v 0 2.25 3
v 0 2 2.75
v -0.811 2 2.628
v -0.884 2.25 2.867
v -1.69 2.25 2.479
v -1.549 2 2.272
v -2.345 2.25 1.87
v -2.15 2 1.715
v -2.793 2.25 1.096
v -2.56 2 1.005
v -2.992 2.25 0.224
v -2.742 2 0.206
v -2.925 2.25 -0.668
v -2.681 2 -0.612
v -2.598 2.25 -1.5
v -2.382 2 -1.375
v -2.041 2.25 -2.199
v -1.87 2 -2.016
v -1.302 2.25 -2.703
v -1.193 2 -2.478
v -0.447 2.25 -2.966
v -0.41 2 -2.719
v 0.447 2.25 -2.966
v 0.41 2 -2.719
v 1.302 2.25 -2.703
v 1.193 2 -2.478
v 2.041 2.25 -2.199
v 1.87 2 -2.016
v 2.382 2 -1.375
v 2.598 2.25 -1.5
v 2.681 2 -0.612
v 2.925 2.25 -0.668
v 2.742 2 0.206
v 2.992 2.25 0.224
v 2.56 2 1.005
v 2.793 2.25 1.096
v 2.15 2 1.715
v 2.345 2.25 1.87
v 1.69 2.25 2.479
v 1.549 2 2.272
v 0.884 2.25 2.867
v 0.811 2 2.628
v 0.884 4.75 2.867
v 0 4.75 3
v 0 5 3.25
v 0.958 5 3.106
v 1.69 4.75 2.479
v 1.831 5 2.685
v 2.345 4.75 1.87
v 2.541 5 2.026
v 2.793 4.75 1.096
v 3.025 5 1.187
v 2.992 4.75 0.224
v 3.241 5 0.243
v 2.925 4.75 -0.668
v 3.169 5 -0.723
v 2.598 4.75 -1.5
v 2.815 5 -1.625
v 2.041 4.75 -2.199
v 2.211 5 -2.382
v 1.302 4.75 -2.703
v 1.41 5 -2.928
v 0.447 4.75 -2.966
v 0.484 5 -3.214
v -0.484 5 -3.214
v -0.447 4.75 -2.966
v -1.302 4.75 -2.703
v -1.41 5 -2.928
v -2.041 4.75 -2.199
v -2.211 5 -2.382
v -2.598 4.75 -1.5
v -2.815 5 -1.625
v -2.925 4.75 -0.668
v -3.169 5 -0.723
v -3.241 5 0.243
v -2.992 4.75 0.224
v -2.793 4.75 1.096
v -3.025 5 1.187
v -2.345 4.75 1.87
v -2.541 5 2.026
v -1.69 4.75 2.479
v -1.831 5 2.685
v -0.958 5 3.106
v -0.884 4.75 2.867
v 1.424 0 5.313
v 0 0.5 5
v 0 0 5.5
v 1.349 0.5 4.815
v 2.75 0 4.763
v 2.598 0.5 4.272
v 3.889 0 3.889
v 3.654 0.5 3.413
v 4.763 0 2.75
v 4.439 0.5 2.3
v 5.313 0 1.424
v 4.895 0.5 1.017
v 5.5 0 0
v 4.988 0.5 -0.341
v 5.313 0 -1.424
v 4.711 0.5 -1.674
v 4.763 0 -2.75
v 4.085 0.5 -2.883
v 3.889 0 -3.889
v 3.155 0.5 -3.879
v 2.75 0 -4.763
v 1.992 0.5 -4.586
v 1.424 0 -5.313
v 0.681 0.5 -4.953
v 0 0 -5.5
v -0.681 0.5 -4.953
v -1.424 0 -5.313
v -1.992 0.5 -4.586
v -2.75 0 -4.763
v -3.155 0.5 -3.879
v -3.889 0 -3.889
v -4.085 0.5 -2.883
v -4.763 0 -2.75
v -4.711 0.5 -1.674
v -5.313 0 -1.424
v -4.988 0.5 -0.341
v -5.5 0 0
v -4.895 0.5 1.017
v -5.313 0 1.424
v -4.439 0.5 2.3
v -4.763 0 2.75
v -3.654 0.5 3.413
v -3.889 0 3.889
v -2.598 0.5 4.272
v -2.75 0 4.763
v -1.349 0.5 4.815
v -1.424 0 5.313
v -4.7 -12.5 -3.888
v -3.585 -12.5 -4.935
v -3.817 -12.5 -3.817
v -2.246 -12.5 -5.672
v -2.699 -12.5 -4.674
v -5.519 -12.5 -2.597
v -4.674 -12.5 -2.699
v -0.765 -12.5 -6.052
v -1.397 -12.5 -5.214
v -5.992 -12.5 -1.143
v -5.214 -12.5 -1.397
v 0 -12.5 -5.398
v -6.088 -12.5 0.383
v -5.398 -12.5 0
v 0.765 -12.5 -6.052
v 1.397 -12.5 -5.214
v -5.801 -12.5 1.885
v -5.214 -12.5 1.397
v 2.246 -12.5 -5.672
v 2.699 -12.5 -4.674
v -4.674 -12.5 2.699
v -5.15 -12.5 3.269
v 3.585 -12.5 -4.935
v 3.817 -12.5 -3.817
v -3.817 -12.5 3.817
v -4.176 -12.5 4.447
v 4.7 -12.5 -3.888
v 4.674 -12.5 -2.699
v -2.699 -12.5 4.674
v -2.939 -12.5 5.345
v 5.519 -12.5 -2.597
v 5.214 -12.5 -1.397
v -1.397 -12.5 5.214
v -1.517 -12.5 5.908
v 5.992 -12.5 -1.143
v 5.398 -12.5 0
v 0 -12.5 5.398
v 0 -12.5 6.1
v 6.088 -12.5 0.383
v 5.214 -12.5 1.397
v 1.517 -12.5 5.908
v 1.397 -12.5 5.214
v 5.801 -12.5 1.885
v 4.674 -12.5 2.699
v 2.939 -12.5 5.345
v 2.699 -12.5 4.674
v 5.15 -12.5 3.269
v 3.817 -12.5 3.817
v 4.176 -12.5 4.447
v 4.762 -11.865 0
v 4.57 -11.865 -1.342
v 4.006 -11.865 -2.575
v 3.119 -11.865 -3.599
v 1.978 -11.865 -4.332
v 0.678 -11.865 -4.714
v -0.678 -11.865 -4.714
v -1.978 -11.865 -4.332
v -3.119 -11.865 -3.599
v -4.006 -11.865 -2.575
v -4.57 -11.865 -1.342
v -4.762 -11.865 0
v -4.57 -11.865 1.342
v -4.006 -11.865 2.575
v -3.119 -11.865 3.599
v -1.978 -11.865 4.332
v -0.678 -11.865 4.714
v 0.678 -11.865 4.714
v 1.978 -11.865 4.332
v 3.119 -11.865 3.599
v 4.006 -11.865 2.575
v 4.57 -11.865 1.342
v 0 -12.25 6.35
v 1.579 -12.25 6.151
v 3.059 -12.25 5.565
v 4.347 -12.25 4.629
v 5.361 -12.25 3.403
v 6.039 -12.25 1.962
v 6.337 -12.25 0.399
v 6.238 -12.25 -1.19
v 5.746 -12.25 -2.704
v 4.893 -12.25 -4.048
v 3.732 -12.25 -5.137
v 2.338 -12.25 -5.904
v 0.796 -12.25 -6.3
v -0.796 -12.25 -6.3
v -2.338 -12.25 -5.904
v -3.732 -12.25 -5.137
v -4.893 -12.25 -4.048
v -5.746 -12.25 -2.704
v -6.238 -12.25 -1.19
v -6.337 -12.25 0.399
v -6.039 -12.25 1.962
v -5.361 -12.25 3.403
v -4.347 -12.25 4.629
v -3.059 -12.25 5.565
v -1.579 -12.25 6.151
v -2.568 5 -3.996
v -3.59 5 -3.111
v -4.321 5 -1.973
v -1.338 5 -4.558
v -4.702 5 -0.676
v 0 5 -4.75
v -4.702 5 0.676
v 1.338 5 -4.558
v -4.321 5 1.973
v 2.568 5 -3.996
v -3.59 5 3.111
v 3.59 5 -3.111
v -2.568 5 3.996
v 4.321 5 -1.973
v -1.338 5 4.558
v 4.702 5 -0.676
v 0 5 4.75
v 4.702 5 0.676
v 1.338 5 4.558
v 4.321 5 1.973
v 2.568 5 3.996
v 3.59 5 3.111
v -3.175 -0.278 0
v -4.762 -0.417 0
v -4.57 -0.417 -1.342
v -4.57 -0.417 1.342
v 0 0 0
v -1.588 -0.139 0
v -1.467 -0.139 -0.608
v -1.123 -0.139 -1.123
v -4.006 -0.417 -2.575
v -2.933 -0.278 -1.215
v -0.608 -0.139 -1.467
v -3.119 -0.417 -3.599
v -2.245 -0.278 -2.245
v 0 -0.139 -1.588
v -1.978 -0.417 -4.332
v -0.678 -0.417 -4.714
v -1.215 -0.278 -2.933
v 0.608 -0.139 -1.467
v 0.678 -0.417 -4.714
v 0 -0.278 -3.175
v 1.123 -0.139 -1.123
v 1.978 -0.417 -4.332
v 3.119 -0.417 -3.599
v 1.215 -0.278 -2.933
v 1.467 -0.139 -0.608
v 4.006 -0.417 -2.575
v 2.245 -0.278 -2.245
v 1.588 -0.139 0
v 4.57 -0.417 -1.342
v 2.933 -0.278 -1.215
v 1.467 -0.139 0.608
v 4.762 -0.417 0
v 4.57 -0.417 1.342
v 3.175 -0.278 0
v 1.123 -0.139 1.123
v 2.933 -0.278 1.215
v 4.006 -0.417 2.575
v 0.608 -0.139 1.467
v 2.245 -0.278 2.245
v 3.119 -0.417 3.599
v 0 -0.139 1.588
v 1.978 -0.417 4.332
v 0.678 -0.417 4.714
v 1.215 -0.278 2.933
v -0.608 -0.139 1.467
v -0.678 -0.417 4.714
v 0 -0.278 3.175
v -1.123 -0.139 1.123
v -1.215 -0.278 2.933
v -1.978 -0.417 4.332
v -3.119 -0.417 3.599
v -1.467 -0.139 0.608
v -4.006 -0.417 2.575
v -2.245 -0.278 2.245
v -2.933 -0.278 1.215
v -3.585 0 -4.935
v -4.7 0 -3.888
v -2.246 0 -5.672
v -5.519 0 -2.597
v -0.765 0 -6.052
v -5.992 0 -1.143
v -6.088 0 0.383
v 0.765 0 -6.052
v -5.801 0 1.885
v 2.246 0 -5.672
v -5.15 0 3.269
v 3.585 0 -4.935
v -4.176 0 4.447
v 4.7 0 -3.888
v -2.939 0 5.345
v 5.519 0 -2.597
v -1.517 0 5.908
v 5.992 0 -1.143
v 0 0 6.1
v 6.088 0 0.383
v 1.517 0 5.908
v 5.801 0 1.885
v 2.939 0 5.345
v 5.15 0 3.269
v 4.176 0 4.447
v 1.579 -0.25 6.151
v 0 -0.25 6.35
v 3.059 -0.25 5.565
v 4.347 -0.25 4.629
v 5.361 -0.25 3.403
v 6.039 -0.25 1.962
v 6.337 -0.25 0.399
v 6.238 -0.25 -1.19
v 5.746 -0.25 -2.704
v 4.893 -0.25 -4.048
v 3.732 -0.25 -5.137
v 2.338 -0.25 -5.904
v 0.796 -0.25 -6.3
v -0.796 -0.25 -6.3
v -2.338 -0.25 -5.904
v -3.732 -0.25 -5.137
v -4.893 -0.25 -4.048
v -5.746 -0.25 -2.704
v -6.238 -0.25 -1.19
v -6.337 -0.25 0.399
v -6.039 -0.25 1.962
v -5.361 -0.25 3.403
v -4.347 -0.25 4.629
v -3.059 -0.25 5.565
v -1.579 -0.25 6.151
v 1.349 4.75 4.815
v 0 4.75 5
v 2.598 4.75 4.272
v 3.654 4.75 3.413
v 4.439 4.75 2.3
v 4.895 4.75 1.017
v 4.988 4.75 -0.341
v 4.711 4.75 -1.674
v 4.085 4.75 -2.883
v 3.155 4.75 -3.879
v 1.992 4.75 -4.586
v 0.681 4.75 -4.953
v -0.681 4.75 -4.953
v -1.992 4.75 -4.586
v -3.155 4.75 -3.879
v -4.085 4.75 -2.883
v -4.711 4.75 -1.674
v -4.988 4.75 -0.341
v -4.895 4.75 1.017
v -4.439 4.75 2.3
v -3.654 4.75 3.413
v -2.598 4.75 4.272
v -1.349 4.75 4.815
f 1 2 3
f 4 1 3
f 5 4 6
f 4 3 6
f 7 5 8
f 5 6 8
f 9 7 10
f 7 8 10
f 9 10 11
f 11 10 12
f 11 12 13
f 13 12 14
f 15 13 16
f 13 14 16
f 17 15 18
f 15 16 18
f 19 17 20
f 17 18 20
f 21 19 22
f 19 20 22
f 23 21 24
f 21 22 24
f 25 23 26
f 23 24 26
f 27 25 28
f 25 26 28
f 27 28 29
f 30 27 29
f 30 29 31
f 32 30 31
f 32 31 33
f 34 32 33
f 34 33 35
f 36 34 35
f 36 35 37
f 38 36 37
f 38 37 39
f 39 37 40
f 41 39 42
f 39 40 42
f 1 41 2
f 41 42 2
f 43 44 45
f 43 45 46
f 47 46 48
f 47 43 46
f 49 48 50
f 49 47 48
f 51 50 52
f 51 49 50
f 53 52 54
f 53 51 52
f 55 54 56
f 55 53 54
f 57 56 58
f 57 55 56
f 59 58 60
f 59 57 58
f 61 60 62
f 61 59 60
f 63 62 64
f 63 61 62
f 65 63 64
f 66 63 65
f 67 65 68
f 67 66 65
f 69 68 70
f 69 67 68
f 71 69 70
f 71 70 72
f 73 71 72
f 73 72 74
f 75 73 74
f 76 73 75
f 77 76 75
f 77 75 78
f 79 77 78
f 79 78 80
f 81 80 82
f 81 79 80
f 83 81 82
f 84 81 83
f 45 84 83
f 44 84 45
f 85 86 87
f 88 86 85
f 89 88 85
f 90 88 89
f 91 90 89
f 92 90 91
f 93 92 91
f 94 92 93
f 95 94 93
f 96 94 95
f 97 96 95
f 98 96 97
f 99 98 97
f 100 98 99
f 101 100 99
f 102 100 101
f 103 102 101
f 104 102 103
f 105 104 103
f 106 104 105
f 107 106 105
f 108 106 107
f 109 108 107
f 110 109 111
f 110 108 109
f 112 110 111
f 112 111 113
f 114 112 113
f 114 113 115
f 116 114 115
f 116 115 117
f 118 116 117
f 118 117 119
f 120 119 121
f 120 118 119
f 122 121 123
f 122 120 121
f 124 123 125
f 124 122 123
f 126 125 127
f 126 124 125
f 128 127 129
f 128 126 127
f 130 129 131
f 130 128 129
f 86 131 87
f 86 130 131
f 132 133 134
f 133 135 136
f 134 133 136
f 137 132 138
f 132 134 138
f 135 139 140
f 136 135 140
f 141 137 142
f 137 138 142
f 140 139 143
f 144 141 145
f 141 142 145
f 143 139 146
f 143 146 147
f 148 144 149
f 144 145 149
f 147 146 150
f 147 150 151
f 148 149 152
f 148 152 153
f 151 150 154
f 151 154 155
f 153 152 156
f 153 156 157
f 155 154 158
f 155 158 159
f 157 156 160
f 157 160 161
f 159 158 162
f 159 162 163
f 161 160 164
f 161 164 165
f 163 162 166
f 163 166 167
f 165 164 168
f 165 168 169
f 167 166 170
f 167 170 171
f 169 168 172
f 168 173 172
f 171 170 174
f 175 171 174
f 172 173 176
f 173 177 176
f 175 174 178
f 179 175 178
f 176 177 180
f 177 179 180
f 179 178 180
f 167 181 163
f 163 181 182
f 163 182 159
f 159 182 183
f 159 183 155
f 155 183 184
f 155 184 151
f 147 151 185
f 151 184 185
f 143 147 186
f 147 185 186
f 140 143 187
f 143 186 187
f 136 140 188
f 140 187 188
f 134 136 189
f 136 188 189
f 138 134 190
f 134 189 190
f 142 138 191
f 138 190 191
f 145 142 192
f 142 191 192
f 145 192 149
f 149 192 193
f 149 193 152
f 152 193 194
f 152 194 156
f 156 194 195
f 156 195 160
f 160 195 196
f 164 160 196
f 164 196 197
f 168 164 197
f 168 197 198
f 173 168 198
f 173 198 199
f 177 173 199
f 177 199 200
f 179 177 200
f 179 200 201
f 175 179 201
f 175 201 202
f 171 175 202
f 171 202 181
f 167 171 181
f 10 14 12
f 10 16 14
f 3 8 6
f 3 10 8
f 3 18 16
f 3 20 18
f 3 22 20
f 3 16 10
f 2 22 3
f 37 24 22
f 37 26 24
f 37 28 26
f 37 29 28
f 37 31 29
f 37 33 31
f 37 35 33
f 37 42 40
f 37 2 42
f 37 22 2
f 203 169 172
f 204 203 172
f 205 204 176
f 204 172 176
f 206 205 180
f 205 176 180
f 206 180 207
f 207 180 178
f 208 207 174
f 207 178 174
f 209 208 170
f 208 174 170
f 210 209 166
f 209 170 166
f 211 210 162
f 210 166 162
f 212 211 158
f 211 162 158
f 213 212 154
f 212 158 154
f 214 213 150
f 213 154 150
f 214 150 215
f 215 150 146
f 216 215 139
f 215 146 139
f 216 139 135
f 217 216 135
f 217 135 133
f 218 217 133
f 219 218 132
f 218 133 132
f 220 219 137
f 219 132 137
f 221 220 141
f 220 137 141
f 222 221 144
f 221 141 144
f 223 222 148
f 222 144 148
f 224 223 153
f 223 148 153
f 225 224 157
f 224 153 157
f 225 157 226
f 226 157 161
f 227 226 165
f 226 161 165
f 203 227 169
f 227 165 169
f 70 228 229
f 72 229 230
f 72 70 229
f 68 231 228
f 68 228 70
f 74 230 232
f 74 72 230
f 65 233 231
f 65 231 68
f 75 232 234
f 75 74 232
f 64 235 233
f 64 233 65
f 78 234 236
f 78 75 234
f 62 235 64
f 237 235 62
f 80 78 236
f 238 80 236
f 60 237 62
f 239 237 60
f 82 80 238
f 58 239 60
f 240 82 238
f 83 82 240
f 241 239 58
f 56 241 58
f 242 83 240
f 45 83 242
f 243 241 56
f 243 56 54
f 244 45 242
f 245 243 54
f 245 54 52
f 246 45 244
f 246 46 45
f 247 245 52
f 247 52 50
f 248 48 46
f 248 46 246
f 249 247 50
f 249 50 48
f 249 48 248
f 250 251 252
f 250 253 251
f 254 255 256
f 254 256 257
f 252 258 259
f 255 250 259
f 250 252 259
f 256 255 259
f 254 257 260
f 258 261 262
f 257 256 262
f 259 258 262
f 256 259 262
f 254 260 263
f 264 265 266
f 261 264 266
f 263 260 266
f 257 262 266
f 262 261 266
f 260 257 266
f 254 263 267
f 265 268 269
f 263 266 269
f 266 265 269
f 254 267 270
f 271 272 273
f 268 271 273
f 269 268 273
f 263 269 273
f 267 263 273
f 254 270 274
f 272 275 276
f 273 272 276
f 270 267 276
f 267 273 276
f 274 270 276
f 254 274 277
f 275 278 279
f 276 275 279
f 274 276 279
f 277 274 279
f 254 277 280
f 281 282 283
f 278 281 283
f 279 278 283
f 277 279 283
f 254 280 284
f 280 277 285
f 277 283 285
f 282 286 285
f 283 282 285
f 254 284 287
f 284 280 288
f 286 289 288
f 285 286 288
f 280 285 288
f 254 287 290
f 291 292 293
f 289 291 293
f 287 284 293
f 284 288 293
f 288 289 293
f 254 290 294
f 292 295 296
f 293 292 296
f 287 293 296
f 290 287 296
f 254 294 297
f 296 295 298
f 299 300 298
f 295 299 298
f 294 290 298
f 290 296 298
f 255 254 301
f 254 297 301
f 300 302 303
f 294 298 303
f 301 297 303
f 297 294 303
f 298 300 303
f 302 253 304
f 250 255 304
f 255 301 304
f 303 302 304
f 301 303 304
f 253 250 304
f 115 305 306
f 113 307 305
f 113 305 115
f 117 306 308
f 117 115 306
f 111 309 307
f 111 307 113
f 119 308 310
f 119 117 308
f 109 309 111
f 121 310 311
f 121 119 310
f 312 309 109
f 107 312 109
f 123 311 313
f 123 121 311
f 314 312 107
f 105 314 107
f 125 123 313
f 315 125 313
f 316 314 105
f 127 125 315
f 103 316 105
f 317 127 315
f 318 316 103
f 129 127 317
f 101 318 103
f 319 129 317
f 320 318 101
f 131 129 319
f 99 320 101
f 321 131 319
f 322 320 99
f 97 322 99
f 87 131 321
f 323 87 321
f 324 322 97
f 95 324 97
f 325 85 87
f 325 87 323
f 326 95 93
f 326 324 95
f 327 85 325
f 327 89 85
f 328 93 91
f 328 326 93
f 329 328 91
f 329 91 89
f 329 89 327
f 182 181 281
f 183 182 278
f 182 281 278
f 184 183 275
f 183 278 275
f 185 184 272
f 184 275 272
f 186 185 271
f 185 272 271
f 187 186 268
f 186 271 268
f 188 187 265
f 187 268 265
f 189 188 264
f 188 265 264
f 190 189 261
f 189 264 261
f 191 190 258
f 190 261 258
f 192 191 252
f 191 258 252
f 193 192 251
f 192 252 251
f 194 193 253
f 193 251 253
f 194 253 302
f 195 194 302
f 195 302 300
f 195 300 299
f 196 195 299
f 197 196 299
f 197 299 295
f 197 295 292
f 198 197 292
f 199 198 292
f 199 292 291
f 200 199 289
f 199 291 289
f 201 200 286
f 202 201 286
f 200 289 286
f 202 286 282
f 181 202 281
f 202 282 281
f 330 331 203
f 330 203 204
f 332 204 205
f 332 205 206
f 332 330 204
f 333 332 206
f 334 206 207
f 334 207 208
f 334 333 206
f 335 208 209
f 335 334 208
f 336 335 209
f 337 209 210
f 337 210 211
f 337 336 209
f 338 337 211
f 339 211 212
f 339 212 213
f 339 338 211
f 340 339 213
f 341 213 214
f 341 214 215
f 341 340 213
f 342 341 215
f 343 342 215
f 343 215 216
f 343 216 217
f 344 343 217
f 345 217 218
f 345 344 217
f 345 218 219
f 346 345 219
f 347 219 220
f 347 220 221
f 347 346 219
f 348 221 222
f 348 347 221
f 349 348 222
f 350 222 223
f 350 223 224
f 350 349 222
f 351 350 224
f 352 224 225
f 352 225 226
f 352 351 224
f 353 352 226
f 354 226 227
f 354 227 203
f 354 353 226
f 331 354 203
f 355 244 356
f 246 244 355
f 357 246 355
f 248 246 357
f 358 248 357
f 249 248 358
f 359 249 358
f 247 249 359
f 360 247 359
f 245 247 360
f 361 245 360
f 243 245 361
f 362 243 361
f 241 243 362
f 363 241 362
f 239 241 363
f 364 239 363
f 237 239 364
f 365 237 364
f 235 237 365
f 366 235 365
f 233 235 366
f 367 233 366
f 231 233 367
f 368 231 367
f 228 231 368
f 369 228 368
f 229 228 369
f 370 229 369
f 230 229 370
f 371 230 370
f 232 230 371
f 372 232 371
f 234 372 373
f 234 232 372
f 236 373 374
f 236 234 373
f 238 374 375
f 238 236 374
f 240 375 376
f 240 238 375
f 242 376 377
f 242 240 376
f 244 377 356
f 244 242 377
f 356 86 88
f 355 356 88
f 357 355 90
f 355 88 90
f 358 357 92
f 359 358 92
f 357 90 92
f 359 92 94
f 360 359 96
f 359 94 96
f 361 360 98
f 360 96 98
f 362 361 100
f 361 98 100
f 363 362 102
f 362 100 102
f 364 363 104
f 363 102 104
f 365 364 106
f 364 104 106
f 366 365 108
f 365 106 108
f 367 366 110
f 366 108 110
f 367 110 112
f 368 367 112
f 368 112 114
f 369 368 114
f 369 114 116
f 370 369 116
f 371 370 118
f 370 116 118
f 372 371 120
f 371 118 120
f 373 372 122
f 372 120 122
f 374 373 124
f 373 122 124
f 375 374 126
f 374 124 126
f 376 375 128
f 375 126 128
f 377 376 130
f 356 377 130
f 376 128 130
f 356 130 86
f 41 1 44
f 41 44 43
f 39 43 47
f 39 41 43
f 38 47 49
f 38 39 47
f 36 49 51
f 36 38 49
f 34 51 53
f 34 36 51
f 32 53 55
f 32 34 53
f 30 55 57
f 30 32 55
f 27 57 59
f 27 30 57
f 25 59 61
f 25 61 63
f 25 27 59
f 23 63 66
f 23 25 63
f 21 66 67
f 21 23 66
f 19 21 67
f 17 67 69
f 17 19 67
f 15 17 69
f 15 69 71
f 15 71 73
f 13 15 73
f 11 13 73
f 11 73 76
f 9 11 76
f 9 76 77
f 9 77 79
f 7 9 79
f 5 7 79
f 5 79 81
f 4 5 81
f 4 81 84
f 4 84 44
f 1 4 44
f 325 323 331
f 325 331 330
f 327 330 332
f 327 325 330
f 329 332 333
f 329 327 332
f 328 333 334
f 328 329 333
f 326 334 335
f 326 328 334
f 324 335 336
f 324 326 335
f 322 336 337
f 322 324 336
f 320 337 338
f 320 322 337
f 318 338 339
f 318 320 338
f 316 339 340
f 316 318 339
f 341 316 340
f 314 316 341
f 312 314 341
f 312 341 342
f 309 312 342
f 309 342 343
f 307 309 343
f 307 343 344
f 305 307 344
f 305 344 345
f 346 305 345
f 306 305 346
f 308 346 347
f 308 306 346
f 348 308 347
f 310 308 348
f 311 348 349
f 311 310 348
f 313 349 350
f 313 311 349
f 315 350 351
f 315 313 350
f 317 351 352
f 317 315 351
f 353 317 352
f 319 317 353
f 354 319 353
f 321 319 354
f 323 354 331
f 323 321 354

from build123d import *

# Parameters (mm, degrees)
SKETCH1_R                              = 5
BOSS_EXTRUDE1_DEPTH                    = 2
SKETCH1_3_R                            = 5
SKETCH1_3_R_2                          = 3
BOSS_EXTRUDE2_DEPTH                    = 5
CHAMFER1_SIZE                          = 0.25
SKETCH5_R                              = 6.35
BOSS_EXTRUDE4_DEPTH                    = 12.5
F_3_8_0_375_DIAMETER_HOLE1_D           = 9.525
F_3_8_0_375_DIAMETER_HOLE1_DEPTH       = 12.08333524
F_3_8_0_375_DIAMETER_HOLE1_CSINK_D     = 10.795
F_3_8_0_375_DIAMETER_HOLE1_CSINK_ANGLE = 90
F_3_8_0_375_DIAMETER_HOLE1_TIP         = 0.41666476
CHAMFER2_SIZE                          = 0.25
CHAMFER3_SIZE                          = 0.5


with BuildPart() as part:
    # Sketch1 → Boss-Extrude1 (new body)
    with BuildSketch(Plane(origin=(0, 0, 0), x_dir=(1, 0, 0), z_dir=(0, 1, 0))):
        Circle(SKETCH1_R)
    extrude(amount=BOSS_EXTRUDE1_DEPTH)

    # Sketch1<3> → Boss-Extrude2 (add)
    with BuildSketch(Plane(origin=(0, 0, 0), x_dir=(1, 0, 0), z_dir=(0, 1, 0))):
        Circle(SKETCH1_3_R)
        Circle(SKETCH1_3_R_2, mode=Mode.SUBTRACT)
    extrude(amount=BOSS_EXTRUDE2_DEPTH)

    # Chamfer1
    chamfer1_edges = [part.edges().sort_by_distance(p)[0] for p in [
        (-3, 5, 0),
        (-5, 5, 0),
        (-3, 2, 0),
    ]]
    chamfer(chamfer1_edges, length=CHAMFER1_SIZE)

    # Sketch5 → Boss-Extrude4 (add)
    with BuildSketch(Plane(origin=(0, 0, 0), x_dir=(1, 0, 0), z_dir=(0, 1, 0))):
        Circle(SKETCH5_R)
    extrude(amount=-BOSS_EXTRUDE4_DEPTH)

    # 3/8 (0.375) Diameter Hole1
    with Locations(Plane(origin=(0, -12.5, 0), x_dir=(-1, 0, 0), z_dir=(0, -1, 0))):
        with Locations((0, 0)):
            CounterSinkHole(F_3_8_0_375_DIAMETER_HOLE1_D / 2, F_3_8_0_375_DIAMETER_HOLE1_CSINK_D / 2, depth=F_3_8_0_375_DIAMETER_HOLE1_DEPTH, counter_sink_angle=F_3_8_0_375_DIAMETER_HOLE1_CSINK_ANGLE)
            with Locations((0, 0, -(F_3_8_0_375_DIAMETER_HOLE1_DEPTH + F_3_8_0_375_DIAMETER_HOLE1_TIP / 2))):  # 170° drill point
                Cone(0, F_3_8_0_375_DIAMETER_HOLE1_D / 2, F_3_8_0_375_DIAMETER_HOLE1_TIP, mode=Mode.SUBTRACT)

    # Chamfer2
    chamfer2_edges = [part.edges().sort_by_distance(p)[0] for p in [
        (-6.35, -12.5, 0),
        (-6.35, 0, 0),
    ]]
    chamfer(chamfer2_edges, length=CHAMFER2_SIZE)

    # Chamfer3
    chamfer3_edges = [part.edges().sort_by_distance(p)[0] for p in [
        (-5, 0, 0),
    ]]
    chamfer(chamfer3_edges, length=CHAMFER3_SIZE)


solid = part.part
